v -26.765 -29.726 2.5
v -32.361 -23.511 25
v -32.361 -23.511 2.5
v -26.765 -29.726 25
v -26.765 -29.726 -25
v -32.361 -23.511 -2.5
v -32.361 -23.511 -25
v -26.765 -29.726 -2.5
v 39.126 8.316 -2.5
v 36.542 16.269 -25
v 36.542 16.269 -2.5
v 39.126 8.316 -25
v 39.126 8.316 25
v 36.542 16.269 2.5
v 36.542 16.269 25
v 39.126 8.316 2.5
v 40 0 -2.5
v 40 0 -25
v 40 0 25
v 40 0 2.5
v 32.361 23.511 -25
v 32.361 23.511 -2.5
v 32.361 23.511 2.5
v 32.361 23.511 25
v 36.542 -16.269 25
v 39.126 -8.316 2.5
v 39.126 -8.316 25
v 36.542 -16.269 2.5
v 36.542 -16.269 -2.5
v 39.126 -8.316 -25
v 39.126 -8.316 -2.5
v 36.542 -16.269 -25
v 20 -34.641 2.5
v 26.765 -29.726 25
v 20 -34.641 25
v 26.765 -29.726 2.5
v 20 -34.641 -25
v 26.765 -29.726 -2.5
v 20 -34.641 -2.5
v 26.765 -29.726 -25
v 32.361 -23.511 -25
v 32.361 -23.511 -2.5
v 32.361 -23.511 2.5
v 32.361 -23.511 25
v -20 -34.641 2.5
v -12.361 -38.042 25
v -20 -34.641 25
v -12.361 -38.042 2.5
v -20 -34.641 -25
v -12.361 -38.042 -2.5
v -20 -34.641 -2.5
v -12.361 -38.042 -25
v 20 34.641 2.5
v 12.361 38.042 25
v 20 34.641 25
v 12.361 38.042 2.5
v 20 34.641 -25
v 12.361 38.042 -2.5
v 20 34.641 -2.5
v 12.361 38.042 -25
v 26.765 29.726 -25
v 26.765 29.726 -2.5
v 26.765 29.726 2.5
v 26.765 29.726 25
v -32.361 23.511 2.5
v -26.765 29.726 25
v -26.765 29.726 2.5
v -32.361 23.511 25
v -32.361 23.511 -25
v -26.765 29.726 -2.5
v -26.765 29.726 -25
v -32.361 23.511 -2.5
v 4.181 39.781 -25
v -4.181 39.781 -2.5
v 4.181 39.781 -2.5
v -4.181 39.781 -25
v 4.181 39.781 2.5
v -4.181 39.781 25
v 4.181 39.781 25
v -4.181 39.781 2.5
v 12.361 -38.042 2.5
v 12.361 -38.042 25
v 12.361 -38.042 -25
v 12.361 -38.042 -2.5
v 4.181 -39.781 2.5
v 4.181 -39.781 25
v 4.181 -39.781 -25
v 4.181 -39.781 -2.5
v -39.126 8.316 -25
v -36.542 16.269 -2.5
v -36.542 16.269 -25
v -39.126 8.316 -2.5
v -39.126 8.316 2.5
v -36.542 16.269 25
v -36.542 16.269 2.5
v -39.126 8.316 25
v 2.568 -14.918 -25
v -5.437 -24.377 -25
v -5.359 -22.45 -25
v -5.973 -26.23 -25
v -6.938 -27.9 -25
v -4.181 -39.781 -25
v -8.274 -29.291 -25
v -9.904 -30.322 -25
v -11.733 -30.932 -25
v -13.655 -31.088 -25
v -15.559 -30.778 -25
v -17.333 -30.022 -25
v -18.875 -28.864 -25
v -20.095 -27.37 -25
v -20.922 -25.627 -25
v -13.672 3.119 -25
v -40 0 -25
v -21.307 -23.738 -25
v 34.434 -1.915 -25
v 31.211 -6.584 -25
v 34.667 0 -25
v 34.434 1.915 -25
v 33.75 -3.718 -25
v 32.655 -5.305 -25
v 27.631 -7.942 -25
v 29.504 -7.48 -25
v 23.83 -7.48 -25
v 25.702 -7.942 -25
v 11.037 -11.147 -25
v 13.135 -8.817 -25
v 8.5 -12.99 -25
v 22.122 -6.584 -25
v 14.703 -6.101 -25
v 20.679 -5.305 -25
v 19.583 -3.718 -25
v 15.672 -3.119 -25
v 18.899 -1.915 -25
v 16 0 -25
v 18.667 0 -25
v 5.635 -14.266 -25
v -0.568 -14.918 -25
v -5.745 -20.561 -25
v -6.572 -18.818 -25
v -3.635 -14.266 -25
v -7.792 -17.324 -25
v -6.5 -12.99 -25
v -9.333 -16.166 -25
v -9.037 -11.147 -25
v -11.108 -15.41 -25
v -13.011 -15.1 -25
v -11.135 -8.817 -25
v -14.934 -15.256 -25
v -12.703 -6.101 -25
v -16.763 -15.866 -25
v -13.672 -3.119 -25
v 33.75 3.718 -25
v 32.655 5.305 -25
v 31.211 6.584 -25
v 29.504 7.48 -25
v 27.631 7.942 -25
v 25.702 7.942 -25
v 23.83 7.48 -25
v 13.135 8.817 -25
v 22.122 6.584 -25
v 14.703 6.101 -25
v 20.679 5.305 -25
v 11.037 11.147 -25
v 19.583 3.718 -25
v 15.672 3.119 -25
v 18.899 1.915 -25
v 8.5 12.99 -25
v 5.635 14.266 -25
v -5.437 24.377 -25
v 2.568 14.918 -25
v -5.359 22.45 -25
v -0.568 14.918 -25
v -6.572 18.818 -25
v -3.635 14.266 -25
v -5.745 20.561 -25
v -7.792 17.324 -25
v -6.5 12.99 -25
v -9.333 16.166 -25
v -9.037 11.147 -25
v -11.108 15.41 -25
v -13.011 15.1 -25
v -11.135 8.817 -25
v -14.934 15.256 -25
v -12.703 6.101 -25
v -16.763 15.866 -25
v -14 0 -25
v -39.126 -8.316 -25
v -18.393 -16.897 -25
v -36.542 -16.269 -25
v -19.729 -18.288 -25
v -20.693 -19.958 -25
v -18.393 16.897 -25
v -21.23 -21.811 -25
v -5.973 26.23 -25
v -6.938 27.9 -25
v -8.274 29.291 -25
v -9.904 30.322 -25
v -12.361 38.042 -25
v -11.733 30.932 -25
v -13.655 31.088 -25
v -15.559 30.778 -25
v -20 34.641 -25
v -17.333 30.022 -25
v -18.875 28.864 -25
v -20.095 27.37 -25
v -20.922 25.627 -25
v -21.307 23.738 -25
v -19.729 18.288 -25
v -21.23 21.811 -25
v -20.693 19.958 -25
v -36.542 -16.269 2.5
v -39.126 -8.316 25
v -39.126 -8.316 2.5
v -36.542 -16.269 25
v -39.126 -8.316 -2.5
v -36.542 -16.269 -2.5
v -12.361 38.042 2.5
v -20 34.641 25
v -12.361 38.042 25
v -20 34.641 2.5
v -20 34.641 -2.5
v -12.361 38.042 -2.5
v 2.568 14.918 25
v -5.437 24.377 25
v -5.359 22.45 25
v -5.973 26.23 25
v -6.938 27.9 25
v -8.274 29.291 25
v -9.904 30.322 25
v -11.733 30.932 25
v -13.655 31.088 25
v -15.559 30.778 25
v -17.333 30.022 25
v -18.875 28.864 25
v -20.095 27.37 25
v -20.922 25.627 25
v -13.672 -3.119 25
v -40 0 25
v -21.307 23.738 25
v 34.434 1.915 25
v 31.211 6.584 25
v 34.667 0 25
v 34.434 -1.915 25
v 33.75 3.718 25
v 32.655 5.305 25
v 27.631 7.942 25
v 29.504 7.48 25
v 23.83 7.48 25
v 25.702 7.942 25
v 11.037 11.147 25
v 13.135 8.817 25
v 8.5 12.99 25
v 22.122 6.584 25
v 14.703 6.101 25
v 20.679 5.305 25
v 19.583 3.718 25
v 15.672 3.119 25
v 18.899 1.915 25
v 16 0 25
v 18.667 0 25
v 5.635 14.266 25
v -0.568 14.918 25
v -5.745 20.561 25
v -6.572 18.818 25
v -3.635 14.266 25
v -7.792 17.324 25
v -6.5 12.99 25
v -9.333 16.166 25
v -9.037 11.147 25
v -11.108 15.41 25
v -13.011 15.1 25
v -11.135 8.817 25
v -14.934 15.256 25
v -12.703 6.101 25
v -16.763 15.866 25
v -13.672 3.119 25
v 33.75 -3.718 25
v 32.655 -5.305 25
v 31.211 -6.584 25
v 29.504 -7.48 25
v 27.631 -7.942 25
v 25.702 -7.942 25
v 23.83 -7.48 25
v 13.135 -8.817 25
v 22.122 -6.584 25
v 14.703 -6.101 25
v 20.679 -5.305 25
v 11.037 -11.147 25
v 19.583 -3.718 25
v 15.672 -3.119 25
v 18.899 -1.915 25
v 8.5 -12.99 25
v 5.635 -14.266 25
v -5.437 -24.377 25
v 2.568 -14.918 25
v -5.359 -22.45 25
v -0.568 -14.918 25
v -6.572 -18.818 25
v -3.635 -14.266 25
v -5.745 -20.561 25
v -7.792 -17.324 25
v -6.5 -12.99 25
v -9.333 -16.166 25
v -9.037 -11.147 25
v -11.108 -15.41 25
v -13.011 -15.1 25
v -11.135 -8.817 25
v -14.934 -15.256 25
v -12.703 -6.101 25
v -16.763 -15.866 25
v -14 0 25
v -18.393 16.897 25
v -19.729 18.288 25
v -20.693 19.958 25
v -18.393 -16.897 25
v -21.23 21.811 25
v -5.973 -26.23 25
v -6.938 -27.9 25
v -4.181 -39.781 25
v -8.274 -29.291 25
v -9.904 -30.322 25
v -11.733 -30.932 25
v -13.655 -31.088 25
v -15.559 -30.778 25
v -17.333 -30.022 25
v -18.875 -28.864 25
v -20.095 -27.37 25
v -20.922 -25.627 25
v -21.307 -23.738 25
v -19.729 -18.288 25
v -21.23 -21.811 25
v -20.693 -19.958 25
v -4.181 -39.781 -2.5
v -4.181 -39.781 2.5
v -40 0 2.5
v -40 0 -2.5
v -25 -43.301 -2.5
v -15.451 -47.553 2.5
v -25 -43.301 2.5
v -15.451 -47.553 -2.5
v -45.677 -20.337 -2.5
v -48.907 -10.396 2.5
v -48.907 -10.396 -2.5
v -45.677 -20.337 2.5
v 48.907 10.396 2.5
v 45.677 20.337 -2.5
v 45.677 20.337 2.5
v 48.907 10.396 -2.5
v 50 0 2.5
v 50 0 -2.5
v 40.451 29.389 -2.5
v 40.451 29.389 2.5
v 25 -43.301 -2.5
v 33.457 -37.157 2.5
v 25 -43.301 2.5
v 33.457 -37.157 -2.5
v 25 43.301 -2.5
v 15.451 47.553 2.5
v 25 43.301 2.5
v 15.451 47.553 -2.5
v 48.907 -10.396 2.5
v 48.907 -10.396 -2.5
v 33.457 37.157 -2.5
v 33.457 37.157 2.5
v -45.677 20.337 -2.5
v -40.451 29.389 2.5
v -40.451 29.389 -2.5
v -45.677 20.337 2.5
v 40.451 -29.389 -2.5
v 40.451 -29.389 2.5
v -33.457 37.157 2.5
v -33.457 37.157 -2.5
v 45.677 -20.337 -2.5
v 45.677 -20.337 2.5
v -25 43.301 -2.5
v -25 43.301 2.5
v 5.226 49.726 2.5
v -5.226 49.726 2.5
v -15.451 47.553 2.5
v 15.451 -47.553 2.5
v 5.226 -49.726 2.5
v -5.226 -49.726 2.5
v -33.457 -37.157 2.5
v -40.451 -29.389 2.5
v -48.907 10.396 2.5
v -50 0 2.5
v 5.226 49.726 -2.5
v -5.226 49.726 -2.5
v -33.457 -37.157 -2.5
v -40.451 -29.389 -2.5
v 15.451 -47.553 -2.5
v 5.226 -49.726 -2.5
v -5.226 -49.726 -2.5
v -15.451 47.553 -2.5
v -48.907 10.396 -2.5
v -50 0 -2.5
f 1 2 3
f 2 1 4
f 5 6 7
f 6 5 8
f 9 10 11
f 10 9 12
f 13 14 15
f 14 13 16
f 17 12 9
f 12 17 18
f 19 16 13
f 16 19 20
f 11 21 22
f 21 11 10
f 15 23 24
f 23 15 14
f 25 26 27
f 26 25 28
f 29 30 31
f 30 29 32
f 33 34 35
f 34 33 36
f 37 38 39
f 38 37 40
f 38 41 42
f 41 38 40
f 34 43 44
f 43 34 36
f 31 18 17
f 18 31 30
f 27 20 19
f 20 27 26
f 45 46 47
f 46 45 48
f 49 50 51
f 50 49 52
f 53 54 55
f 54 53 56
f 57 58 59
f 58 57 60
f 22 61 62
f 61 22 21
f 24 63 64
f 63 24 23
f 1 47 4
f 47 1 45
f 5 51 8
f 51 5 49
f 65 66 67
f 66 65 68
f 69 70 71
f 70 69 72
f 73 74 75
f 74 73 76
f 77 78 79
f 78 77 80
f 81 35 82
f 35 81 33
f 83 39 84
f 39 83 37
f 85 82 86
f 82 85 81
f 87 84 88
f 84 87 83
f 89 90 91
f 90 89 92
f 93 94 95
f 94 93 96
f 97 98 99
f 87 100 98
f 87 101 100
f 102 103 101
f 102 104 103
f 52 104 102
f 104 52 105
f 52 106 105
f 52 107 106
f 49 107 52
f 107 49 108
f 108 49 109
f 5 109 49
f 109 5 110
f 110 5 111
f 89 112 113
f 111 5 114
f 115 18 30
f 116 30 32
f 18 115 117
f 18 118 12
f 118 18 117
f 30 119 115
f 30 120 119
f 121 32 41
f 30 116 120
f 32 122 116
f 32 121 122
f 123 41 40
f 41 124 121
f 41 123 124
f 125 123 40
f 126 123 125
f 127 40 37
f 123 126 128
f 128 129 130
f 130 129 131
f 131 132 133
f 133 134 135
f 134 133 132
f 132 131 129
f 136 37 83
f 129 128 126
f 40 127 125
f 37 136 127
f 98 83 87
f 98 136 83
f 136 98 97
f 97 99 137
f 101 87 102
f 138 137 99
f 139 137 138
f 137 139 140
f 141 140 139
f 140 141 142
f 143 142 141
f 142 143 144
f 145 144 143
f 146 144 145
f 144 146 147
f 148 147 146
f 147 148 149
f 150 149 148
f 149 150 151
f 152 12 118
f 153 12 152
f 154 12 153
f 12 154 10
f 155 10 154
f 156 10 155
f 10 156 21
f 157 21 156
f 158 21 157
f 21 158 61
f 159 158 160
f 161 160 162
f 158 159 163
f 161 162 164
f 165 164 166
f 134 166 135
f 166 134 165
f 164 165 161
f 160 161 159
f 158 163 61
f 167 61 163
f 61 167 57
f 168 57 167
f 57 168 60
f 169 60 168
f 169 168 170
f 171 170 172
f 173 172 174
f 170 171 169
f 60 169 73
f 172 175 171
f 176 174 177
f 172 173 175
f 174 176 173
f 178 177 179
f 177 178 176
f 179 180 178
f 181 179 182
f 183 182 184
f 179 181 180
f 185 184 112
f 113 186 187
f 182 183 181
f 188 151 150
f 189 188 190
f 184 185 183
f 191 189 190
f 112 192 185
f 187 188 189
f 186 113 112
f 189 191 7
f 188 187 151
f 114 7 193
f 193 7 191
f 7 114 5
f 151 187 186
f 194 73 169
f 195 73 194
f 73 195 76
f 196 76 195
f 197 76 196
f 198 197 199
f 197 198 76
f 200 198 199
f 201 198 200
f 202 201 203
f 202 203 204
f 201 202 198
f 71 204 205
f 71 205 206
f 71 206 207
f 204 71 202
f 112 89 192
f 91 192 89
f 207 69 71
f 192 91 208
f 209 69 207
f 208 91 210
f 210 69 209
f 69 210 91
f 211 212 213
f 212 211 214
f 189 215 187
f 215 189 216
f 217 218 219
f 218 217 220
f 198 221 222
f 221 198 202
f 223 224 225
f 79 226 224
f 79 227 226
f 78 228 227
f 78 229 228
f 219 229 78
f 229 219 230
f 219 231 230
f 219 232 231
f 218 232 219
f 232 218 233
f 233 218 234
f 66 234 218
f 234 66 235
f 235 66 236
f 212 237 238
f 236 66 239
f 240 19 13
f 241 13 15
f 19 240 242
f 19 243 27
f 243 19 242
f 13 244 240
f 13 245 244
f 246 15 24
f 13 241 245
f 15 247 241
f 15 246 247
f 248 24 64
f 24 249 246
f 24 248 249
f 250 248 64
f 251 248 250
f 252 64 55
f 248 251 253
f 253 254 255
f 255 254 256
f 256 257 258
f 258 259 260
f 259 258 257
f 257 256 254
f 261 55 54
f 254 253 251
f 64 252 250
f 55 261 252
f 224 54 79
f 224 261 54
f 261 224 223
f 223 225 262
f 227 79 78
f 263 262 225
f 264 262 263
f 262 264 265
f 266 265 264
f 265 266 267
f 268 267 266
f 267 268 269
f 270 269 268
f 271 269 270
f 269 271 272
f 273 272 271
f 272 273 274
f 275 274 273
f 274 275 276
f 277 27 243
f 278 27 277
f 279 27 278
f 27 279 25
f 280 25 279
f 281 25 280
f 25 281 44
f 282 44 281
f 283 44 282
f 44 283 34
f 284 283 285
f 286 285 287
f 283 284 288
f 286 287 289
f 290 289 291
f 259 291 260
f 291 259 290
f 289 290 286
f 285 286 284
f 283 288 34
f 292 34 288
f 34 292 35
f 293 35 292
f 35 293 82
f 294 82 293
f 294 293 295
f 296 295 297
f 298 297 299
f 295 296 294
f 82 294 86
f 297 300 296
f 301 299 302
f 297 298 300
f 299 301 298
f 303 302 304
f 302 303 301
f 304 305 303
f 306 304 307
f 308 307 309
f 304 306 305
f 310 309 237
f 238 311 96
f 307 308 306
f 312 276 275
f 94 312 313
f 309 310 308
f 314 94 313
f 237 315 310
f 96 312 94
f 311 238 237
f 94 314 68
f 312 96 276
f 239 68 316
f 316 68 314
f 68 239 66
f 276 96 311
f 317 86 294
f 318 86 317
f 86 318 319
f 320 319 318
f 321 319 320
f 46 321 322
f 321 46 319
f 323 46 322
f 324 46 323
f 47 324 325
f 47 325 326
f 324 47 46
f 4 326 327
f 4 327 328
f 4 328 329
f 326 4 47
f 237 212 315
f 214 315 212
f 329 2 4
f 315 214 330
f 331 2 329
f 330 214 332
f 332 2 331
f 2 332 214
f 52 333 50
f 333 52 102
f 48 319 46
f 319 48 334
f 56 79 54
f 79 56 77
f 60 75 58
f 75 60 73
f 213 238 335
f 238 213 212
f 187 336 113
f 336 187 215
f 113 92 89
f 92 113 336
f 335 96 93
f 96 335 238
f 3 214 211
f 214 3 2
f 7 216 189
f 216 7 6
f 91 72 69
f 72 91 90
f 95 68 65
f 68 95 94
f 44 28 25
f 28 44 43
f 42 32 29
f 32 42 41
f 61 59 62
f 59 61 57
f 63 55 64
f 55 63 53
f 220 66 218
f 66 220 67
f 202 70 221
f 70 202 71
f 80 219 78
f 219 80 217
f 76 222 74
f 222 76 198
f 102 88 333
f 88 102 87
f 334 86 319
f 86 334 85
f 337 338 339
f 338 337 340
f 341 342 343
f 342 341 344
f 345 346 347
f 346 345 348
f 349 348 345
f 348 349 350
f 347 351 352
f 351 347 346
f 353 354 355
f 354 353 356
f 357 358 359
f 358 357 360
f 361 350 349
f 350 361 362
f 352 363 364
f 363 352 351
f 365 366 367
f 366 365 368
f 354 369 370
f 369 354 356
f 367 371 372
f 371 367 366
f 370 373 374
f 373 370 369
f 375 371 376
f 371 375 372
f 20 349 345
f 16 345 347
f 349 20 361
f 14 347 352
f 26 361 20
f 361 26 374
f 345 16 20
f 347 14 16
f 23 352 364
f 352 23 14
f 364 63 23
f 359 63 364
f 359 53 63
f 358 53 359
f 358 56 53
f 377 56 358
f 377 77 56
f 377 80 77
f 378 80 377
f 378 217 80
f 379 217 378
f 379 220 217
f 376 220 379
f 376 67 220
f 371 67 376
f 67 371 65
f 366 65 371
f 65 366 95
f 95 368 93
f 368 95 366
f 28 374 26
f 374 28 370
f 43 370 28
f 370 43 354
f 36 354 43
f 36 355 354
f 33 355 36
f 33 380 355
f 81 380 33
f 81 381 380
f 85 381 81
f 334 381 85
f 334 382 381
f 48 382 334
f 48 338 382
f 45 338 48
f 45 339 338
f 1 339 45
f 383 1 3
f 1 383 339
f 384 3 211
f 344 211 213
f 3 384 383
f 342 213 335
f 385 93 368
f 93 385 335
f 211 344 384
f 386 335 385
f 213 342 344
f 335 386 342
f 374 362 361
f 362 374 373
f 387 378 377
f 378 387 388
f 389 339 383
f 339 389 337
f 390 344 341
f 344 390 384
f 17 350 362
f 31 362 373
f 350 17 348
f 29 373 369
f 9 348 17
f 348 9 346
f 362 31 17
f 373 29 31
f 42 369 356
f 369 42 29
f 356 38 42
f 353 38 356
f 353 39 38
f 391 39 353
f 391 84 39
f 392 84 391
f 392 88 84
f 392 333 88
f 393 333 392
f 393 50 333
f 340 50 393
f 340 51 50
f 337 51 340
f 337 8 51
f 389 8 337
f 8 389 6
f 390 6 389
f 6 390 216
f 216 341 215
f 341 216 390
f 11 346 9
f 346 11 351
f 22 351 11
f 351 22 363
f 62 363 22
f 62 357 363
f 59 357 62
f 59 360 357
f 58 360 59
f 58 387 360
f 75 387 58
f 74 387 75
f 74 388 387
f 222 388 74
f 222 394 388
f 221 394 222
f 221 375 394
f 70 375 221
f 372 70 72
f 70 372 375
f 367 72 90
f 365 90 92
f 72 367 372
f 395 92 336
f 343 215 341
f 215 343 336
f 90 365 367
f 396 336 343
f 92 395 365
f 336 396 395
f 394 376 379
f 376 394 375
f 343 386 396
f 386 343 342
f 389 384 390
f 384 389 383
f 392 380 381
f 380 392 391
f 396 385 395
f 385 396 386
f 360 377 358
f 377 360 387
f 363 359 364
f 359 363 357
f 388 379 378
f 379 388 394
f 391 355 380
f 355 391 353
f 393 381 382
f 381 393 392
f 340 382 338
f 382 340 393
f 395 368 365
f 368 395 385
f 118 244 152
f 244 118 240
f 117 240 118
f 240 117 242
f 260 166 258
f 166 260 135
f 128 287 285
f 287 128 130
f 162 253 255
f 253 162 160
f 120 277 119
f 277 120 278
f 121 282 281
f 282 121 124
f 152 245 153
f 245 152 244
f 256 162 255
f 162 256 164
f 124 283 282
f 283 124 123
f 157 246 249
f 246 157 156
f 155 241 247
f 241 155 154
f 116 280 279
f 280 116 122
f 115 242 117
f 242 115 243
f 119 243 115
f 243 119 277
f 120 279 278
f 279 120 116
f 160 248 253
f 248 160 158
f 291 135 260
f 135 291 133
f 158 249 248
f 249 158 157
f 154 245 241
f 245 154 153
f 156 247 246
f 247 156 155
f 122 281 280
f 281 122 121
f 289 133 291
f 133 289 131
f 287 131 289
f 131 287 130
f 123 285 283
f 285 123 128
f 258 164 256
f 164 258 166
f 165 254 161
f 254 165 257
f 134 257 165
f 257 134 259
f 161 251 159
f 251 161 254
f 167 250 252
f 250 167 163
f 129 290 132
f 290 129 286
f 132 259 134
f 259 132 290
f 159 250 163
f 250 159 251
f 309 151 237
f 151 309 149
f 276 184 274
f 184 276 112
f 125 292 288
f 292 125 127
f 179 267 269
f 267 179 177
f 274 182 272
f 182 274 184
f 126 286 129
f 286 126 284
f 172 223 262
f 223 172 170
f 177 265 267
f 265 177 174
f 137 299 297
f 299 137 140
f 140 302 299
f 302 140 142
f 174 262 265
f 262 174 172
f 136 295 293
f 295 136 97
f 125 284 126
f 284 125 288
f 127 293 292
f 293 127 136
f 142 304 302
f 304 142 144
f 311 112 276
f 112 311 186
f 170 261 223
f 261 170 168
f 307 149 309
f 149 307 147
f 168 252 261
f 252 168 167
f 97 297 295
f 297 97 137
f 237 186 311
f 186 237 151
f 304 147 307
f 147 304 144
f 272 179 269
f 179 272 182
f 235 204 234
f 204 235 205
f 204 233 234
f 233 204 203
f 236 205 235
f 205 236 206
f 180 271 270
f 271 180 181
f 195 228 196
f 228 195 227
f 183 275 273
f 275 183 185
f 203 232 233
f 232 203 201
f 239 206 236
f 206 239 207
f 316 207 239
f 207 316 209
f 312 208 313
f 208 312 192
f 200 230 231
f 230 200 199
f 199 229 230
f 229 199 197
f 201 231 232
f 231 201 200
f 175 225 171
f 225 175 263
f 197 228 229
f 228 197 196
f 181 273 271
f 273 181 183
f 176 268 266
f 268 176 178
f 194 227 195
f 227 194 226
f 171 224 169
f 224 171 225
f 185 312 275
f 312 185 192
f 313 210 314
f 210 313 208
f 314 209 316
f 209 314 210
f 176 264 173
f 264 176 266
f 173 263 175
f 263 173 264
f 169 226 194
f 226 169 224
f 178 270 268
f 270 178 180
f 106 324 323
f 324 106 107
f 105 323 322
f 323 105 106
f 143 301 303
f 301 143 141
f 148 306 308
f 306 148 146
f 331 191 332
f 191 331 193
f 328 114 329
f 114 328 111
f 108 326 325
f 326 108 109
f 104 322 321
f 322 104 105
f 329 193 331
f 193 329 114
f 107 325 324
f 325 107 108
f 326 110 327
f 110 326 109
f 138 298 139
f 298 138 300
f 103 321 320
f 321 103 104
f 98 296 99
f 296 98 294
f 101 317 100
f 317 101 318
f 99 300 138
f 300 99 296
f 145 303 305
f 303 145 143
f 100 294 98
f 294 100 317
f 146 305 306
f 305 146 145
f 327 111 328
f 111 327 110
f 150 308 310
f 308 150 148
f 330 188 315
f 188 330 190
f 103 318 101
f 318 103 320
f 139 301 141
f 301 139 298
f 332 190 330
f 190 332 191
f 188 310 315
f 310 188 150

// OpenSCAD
// globals
co_radius = 40;
co_height = 50;

module complexObject()
{
	difference()
	{
		union()
		{
			cylinder(r=co_radius, h=co_height, center=true);
			cylinder(r=50, h=5, center=true);

			for(r=[0:5])
			{

			}
		}
		
		union()
		{
			for(r=[0:4])
			{
				rotate([0,0,r*360/3]) translate([co_radius/1.5, 0, 0])	 cylinder(r=8, h=co_height*1.1, center=true);
				rotate([0,0,r*360/1]) translate([co_radius/40, 0, 0])	 cylinder(r=15, h=co_height*1.1, center=true);

			}
		}
	}
}



complexObject();
